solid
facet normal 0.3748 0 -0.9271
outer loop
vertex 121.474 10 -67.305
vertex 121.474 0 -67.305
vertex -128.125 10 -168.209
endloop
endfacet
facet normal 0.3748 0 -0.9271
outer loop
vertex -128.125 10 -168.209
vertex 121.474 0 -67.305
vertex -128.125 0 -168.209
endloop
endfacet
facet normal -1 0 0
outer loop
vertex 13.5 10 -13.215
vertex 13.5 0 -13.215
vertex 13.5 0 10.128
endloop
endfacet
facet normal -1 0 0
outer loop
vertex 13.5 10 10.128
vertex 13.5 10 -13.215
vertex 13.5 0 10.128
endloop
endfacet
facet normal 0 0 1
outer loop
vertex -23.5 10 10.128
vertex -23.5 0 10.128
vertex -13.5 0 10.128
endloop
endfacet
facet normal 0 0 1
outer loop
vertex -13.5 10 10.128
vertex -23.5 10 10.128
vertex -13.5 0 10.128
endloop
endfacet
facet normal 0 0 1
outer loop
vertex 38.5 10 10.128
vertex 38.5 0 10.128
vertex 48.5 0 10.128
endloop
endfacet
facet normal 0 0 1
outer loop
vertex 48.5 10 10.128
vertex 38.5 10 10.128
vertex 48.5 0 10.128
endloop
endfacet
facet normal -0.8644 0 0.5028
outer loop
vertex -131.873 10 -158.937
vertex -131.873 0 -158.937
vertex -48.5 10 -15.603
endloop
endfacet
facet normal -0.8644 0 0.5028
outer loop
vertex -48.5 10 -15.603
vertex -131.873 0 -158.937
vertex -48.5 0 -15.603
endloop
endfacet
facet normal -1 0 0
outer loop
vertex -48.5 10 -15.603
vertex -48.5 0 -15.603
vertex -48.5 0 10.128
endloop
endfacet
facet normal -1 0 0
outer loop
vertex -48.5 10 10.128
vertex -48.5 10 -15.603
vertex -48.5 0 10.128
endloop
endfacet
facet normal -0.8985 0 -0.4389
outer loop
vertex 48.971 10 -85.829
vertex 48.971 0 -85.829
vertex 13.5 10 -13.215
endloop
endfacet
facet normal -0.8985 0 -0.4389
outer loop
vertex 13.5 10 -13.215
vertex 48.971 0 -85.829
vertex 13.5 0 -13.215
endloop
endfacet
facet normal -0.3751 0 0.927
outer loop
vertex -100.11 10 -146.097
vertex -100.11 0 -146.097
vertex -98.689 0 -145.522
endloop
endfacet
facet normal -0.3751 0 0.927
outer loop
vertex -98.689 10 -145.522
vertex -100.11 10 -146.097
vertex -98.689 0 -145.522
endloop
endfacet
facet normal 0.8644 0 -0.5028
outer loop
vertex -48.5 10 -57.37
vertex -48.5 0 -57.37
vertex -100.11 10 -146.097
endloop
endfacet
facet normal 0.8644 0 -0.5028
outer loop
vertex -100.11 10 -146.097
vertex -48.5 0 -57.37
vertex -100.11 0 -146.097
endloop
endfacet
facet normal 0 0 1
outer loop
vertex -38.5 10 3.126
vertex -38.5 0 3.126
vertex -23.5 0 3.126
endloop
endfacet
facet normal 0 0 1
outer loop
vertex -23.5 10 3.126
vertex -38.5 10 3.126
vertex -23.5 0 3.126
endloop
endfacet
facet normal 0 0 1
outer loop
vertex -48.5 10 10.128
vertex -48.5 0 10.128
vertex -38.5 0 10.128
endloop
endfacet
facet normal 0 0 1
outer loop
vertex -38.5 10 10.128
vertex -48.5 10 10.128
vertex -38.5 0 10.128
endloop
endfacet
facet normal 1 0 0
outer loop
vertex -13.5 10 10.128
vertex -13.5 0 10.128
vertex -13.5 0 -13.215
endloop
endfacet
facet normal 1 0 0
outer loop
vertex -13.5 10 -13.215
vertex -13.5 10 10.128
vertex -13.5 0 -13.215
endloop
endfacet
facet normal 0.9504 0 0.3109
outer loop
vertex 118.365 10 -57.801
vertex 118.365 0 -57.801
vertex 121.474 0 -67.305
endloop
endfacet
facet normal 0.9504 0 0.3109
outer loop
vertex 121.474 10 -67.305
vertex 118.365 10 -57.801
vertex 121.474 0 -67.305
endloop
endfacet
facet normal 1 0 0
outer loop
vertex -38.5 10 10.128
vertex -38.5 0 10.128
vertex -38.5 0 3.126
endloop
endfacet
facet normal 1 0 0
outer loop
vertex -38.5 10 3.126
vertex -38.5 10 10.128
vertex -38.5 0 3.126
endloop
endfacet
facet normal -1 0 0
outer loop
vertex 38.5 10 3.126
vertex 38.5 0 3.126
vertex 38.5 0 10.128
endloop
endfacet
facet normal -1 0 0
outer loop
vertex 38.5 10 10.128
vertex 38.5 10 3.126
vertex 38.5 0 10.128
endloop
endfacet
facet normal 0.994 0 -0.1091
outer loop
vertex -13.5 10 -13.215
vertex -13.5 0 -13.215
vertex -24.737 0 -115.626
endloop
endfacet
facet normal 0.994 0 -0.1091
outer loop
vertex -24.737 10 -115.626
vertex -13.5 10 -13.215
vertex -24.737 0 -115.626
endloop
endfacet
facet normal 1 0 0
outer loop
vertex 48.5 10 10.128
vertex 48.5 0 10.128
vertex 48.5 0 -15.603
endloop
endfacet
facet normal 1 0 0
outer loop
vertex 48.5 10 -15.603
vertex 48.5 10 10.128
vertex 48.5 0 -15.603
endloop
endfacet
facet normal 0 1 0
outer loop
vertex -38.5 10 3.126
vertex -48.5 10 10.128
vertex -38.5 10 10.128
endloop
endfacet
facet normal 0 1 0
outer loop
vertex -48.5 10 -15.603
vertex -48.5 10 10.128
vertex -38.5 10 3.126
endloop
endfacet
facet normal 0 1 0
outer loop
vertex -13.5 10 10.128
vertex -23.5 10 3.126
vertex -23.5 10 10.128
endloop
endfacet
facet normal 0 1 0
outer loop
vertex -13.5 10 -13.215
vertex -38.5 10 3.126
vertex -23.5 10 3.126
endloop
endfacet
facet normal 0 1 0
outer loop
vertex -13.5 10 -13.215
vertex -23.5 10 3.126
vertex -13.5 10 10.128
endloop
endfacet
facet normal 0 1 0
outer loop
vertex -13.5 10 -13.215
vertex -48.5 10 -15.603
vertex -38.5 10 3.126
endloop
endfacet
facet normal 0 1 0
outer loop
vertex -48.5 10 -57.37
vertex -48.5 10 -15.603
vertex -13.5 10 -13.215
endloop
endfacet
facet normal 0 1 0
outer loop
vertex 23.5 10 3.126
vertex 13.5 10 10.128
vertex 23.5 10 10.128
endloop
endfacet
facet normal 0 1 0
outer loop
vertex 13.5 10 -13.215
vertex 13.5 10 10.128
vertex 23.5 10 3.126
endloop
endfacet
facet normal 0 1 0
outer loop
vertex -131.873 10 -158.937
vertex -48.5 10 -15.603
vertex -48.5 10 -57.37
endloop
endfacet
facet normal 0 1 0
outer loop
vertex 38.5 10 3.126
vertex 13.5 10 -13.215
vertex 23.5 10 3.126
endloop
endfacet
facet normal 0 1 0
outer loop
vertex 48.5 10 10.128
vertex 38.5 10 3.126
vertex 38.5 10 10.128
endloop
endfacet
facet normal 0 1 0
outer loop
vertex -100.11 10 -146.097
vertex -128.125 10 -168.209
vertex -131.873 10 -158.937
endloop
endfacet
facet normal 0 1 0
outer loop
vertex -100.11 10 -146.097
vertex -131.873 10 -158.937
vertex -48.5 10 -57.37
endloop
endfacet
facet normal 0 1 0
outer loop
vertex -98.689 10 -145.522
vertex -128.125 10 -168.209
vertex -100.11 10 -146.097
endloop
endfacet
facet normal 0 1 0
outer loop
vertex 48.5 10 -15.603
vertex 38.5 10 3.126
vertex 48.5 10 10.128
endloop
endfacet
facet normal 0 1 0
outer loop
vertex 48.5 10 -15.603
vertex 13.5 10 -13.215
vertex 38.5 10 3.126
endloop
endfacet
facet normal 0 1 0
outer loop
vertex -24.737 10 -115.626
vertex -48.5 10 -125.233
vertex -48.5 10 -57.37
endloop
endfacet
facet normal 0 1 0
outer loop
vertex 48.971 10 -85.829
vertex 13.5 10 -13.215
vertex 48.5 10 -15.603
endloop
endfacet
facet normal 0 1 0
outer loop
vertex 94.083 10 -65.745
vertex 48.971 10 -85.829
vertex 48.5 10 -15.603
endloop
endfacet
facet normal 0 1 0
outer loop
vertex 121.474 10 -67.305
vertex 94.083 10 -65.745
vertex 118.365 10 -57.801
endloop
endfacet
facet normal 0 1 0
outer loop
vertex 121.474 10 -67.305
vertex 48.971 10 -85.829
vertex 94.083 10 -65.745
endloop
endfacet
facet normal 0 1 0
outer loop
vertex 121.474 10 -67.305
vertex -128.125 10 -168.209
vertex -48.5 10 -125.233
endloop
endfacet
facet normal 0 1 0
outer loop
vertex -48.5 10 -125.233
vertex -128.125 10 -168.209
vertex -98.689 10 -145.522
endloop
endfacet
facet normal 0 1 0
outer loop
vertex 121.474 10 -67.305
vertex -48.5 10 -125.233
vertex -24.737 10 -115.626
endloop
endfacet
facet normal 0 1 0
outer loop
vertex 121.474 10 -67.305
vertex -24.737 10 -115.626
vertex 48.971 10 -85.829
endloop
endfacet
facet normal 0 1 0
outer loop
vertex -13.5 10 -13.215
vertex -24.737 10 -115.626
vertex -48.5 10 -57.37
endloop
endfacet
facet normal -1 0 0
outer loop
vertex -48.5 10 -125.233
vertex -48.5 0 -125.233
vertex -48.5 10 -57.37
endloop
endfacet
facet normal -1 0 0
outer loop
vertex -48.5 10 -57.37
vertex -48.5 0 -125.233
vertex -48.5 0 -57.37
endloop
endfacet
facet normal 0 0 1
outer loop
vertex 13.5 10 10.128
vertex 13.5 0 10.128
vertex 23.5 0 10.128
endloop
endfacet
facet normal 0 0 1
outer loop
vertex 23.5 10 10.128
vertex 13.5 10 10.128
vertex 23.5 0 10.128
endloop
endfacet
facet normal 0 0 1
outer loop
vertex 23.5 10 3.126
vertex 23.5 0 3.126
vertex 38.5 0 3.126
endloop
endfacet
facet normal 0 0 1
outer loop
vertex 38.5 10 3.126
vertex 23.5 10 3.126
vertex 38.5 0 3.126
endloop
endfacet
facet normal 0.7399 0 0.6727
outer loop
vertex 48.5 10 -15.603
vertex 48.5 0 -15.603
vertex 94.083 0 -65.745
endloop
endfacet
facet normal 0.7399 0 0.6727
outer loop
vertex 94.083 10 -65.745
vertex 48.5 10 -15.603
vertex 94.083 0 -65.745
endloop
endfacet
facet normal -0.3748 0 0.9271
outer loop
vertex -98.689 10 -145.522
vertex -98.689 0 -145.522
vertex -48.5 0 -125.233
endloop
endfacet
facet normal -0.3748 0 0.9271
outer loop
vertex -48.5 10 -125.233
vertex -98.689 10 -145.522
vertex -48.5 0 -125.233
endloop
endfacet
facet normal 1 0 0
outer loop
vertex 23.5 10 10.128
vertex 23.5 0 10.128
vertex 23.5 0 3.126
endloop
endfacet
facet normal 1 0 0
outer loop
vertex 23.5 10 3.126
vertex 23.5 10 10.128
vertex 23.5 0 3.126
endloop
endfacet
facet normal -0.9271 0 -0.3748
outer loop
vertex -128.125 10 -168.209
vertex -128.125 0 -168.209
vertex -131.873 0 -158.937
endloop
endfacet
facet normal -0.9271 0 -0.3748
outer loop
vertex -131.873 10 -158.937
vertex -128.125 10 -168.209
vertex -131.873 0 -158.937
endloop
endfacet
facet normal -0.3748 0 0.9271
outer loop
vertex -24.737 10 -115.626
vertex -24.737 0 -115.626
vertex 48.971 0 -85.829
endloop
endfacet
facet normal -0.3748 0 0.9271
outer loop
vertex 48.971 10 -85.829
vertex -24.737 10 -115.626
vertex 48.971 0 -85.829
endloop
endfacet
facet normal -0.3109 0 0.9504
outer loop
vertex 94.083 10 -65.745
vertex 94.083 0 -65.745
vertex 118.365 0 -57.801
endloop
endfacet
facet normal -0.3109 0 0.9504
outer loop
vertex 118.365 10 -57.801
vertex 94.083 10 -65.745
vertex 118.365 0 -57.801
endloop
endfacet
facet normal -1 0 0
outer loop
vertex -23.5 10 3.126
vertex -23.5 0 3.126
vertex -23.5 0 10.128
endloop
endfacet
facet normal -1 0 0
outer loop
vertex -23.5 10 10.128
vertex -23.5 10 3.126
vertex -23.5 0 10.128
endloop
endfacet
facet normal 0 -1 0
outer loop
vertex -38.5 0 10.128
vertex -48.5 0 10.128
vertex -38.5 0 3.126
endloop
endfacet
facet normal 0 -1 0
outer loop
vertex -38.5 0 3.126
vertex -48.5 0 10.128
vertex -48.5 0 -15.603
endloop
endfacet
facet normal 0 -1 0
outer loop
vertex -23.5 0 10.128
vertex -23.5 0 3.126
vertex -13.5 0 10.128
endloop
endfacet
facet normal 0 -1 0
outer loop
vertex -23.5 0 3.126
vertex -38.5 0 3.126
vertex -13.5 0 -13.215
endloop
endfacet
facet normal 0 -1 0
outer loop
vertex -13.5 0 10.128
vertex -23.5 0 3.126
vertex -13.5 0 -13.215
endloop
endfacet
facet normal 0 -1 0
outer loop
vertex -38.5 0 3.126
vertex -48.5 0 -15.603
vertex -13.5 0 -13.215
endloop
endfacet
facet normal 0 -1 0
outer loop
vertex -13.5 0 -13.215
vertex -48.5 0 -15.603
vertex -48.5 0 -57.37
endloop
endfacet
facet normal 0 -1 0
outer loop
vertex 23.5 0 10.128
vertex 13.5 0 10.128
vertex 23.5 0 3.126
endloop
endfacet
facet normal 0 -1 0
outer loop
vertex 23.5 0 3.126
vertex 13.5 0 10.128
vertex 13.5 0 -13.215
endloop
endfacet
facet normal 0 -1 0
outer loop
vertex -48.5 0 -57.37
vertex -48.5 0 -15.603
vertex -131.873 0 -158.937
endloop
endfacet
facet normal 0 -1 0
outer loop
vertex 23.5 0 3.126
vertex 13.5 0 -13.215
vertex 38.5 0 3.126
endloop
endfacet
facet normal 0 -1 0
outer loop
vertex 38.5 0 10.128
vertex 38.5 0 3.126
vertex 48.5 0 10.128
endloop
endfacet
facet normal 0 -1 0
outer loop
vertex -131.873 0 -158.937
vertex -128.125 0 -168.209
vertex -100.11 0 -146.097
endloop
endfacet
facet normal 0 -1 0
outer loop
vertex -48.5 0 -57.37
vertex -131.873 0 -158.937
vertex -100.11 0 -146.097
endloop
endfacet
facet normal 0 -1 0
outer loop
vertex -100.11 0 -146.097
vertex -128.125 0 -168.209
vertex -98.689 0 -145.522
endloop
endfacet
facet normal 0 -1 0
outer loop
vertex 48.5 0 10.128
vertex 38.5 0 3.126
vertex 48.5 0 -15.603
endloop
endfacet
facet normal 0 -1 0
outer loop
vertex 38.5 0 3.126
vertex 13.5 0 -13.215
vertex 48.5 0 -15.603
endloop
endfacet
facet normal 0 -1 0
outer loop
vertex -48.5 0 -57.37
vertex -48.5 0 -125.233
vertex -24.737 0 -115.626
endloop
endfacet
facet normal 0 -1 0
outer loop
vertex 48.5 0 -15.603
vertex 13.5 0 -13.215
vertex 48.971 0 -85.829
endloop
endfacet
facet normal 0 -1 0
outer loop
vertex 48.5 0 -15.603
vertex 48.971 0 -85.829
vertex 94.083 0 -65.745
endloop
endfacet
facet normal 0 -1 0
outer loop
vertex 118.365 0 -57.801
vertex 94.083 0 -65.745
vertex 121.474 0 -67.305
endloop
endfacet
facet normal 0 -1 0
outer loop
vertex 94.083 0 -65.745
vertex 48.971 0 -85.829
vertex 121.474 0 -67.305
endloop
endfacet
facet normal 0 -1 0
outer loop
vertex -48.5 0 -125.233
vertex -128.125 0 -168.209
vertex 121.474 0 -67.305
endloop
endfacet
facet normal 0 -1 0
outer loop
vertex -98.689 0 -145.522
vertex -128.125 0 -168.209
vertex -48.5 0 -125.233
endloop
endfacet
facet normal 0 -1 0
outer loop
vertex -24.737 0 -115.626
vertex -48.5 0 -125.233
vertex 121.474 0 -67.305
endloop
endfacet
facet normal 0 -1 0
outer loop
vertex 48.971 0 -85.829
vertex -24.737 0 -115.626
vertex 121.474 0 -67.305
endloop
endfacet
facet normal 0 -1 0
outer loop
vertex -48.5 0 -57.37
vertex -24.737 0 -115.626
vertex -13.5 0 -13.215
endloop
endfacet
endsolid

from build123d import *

# Parameters (mm, degrees)
BOSS_EXTRUDE1_DEPTH = 10


with BuildPart() as part:
    # Sketch1 → Boss-Extrude1 (new body)
    with BuildSketch(Plane(origin=(0, 0, 0), x_dir=(1, 0, 0), z_dir=(0, 1, 0))):
        Polygon((13.5, 3.125985755), (13.5, -3.125985755), (13.5, -10.128193845), (23.5, -10.128193845), (23.5, -3.125985755), (38.5, -3.125985755), (38.5, -10.128193845), (48.5, -10.128193845), (48.5, -3.125985755), (48.5, 15.603410537), (94.082583098, 65.745372538), (118.364573122, 57.800903455), (121.474127931, 67.305148238), (-128.125479481, 168.208510016), (-131.873415704, 158.937427336), (-48.5, 15.603410537), (-48.5, -3.125985755), (-48.5, -10.128193845), (-38.5, -10.128193845), (-38.5, -3.125985755), (-23.5, -3.125985755), (-23.5, -10.128193845), (-13.5, -10.128193845), (-13.5, -3.125985755), (-13.5, 3.125985755), (-13.5, 13.214699594), (-24.737103286, 115.626405321), (48.971306344, 85.828977352), (13.5, 13.214699594), align=None)
        Polygon((-98.688732225, 145.522157347), (-48.5, 125.232815319), (-48.5, 57.36957732), (-100.110149338, 146.096780708), align=None, mode=Mode.SUBTRACT)
    extrude(amount=BOSS_EXTRUDE1_DEPTH)


solid = part.part
